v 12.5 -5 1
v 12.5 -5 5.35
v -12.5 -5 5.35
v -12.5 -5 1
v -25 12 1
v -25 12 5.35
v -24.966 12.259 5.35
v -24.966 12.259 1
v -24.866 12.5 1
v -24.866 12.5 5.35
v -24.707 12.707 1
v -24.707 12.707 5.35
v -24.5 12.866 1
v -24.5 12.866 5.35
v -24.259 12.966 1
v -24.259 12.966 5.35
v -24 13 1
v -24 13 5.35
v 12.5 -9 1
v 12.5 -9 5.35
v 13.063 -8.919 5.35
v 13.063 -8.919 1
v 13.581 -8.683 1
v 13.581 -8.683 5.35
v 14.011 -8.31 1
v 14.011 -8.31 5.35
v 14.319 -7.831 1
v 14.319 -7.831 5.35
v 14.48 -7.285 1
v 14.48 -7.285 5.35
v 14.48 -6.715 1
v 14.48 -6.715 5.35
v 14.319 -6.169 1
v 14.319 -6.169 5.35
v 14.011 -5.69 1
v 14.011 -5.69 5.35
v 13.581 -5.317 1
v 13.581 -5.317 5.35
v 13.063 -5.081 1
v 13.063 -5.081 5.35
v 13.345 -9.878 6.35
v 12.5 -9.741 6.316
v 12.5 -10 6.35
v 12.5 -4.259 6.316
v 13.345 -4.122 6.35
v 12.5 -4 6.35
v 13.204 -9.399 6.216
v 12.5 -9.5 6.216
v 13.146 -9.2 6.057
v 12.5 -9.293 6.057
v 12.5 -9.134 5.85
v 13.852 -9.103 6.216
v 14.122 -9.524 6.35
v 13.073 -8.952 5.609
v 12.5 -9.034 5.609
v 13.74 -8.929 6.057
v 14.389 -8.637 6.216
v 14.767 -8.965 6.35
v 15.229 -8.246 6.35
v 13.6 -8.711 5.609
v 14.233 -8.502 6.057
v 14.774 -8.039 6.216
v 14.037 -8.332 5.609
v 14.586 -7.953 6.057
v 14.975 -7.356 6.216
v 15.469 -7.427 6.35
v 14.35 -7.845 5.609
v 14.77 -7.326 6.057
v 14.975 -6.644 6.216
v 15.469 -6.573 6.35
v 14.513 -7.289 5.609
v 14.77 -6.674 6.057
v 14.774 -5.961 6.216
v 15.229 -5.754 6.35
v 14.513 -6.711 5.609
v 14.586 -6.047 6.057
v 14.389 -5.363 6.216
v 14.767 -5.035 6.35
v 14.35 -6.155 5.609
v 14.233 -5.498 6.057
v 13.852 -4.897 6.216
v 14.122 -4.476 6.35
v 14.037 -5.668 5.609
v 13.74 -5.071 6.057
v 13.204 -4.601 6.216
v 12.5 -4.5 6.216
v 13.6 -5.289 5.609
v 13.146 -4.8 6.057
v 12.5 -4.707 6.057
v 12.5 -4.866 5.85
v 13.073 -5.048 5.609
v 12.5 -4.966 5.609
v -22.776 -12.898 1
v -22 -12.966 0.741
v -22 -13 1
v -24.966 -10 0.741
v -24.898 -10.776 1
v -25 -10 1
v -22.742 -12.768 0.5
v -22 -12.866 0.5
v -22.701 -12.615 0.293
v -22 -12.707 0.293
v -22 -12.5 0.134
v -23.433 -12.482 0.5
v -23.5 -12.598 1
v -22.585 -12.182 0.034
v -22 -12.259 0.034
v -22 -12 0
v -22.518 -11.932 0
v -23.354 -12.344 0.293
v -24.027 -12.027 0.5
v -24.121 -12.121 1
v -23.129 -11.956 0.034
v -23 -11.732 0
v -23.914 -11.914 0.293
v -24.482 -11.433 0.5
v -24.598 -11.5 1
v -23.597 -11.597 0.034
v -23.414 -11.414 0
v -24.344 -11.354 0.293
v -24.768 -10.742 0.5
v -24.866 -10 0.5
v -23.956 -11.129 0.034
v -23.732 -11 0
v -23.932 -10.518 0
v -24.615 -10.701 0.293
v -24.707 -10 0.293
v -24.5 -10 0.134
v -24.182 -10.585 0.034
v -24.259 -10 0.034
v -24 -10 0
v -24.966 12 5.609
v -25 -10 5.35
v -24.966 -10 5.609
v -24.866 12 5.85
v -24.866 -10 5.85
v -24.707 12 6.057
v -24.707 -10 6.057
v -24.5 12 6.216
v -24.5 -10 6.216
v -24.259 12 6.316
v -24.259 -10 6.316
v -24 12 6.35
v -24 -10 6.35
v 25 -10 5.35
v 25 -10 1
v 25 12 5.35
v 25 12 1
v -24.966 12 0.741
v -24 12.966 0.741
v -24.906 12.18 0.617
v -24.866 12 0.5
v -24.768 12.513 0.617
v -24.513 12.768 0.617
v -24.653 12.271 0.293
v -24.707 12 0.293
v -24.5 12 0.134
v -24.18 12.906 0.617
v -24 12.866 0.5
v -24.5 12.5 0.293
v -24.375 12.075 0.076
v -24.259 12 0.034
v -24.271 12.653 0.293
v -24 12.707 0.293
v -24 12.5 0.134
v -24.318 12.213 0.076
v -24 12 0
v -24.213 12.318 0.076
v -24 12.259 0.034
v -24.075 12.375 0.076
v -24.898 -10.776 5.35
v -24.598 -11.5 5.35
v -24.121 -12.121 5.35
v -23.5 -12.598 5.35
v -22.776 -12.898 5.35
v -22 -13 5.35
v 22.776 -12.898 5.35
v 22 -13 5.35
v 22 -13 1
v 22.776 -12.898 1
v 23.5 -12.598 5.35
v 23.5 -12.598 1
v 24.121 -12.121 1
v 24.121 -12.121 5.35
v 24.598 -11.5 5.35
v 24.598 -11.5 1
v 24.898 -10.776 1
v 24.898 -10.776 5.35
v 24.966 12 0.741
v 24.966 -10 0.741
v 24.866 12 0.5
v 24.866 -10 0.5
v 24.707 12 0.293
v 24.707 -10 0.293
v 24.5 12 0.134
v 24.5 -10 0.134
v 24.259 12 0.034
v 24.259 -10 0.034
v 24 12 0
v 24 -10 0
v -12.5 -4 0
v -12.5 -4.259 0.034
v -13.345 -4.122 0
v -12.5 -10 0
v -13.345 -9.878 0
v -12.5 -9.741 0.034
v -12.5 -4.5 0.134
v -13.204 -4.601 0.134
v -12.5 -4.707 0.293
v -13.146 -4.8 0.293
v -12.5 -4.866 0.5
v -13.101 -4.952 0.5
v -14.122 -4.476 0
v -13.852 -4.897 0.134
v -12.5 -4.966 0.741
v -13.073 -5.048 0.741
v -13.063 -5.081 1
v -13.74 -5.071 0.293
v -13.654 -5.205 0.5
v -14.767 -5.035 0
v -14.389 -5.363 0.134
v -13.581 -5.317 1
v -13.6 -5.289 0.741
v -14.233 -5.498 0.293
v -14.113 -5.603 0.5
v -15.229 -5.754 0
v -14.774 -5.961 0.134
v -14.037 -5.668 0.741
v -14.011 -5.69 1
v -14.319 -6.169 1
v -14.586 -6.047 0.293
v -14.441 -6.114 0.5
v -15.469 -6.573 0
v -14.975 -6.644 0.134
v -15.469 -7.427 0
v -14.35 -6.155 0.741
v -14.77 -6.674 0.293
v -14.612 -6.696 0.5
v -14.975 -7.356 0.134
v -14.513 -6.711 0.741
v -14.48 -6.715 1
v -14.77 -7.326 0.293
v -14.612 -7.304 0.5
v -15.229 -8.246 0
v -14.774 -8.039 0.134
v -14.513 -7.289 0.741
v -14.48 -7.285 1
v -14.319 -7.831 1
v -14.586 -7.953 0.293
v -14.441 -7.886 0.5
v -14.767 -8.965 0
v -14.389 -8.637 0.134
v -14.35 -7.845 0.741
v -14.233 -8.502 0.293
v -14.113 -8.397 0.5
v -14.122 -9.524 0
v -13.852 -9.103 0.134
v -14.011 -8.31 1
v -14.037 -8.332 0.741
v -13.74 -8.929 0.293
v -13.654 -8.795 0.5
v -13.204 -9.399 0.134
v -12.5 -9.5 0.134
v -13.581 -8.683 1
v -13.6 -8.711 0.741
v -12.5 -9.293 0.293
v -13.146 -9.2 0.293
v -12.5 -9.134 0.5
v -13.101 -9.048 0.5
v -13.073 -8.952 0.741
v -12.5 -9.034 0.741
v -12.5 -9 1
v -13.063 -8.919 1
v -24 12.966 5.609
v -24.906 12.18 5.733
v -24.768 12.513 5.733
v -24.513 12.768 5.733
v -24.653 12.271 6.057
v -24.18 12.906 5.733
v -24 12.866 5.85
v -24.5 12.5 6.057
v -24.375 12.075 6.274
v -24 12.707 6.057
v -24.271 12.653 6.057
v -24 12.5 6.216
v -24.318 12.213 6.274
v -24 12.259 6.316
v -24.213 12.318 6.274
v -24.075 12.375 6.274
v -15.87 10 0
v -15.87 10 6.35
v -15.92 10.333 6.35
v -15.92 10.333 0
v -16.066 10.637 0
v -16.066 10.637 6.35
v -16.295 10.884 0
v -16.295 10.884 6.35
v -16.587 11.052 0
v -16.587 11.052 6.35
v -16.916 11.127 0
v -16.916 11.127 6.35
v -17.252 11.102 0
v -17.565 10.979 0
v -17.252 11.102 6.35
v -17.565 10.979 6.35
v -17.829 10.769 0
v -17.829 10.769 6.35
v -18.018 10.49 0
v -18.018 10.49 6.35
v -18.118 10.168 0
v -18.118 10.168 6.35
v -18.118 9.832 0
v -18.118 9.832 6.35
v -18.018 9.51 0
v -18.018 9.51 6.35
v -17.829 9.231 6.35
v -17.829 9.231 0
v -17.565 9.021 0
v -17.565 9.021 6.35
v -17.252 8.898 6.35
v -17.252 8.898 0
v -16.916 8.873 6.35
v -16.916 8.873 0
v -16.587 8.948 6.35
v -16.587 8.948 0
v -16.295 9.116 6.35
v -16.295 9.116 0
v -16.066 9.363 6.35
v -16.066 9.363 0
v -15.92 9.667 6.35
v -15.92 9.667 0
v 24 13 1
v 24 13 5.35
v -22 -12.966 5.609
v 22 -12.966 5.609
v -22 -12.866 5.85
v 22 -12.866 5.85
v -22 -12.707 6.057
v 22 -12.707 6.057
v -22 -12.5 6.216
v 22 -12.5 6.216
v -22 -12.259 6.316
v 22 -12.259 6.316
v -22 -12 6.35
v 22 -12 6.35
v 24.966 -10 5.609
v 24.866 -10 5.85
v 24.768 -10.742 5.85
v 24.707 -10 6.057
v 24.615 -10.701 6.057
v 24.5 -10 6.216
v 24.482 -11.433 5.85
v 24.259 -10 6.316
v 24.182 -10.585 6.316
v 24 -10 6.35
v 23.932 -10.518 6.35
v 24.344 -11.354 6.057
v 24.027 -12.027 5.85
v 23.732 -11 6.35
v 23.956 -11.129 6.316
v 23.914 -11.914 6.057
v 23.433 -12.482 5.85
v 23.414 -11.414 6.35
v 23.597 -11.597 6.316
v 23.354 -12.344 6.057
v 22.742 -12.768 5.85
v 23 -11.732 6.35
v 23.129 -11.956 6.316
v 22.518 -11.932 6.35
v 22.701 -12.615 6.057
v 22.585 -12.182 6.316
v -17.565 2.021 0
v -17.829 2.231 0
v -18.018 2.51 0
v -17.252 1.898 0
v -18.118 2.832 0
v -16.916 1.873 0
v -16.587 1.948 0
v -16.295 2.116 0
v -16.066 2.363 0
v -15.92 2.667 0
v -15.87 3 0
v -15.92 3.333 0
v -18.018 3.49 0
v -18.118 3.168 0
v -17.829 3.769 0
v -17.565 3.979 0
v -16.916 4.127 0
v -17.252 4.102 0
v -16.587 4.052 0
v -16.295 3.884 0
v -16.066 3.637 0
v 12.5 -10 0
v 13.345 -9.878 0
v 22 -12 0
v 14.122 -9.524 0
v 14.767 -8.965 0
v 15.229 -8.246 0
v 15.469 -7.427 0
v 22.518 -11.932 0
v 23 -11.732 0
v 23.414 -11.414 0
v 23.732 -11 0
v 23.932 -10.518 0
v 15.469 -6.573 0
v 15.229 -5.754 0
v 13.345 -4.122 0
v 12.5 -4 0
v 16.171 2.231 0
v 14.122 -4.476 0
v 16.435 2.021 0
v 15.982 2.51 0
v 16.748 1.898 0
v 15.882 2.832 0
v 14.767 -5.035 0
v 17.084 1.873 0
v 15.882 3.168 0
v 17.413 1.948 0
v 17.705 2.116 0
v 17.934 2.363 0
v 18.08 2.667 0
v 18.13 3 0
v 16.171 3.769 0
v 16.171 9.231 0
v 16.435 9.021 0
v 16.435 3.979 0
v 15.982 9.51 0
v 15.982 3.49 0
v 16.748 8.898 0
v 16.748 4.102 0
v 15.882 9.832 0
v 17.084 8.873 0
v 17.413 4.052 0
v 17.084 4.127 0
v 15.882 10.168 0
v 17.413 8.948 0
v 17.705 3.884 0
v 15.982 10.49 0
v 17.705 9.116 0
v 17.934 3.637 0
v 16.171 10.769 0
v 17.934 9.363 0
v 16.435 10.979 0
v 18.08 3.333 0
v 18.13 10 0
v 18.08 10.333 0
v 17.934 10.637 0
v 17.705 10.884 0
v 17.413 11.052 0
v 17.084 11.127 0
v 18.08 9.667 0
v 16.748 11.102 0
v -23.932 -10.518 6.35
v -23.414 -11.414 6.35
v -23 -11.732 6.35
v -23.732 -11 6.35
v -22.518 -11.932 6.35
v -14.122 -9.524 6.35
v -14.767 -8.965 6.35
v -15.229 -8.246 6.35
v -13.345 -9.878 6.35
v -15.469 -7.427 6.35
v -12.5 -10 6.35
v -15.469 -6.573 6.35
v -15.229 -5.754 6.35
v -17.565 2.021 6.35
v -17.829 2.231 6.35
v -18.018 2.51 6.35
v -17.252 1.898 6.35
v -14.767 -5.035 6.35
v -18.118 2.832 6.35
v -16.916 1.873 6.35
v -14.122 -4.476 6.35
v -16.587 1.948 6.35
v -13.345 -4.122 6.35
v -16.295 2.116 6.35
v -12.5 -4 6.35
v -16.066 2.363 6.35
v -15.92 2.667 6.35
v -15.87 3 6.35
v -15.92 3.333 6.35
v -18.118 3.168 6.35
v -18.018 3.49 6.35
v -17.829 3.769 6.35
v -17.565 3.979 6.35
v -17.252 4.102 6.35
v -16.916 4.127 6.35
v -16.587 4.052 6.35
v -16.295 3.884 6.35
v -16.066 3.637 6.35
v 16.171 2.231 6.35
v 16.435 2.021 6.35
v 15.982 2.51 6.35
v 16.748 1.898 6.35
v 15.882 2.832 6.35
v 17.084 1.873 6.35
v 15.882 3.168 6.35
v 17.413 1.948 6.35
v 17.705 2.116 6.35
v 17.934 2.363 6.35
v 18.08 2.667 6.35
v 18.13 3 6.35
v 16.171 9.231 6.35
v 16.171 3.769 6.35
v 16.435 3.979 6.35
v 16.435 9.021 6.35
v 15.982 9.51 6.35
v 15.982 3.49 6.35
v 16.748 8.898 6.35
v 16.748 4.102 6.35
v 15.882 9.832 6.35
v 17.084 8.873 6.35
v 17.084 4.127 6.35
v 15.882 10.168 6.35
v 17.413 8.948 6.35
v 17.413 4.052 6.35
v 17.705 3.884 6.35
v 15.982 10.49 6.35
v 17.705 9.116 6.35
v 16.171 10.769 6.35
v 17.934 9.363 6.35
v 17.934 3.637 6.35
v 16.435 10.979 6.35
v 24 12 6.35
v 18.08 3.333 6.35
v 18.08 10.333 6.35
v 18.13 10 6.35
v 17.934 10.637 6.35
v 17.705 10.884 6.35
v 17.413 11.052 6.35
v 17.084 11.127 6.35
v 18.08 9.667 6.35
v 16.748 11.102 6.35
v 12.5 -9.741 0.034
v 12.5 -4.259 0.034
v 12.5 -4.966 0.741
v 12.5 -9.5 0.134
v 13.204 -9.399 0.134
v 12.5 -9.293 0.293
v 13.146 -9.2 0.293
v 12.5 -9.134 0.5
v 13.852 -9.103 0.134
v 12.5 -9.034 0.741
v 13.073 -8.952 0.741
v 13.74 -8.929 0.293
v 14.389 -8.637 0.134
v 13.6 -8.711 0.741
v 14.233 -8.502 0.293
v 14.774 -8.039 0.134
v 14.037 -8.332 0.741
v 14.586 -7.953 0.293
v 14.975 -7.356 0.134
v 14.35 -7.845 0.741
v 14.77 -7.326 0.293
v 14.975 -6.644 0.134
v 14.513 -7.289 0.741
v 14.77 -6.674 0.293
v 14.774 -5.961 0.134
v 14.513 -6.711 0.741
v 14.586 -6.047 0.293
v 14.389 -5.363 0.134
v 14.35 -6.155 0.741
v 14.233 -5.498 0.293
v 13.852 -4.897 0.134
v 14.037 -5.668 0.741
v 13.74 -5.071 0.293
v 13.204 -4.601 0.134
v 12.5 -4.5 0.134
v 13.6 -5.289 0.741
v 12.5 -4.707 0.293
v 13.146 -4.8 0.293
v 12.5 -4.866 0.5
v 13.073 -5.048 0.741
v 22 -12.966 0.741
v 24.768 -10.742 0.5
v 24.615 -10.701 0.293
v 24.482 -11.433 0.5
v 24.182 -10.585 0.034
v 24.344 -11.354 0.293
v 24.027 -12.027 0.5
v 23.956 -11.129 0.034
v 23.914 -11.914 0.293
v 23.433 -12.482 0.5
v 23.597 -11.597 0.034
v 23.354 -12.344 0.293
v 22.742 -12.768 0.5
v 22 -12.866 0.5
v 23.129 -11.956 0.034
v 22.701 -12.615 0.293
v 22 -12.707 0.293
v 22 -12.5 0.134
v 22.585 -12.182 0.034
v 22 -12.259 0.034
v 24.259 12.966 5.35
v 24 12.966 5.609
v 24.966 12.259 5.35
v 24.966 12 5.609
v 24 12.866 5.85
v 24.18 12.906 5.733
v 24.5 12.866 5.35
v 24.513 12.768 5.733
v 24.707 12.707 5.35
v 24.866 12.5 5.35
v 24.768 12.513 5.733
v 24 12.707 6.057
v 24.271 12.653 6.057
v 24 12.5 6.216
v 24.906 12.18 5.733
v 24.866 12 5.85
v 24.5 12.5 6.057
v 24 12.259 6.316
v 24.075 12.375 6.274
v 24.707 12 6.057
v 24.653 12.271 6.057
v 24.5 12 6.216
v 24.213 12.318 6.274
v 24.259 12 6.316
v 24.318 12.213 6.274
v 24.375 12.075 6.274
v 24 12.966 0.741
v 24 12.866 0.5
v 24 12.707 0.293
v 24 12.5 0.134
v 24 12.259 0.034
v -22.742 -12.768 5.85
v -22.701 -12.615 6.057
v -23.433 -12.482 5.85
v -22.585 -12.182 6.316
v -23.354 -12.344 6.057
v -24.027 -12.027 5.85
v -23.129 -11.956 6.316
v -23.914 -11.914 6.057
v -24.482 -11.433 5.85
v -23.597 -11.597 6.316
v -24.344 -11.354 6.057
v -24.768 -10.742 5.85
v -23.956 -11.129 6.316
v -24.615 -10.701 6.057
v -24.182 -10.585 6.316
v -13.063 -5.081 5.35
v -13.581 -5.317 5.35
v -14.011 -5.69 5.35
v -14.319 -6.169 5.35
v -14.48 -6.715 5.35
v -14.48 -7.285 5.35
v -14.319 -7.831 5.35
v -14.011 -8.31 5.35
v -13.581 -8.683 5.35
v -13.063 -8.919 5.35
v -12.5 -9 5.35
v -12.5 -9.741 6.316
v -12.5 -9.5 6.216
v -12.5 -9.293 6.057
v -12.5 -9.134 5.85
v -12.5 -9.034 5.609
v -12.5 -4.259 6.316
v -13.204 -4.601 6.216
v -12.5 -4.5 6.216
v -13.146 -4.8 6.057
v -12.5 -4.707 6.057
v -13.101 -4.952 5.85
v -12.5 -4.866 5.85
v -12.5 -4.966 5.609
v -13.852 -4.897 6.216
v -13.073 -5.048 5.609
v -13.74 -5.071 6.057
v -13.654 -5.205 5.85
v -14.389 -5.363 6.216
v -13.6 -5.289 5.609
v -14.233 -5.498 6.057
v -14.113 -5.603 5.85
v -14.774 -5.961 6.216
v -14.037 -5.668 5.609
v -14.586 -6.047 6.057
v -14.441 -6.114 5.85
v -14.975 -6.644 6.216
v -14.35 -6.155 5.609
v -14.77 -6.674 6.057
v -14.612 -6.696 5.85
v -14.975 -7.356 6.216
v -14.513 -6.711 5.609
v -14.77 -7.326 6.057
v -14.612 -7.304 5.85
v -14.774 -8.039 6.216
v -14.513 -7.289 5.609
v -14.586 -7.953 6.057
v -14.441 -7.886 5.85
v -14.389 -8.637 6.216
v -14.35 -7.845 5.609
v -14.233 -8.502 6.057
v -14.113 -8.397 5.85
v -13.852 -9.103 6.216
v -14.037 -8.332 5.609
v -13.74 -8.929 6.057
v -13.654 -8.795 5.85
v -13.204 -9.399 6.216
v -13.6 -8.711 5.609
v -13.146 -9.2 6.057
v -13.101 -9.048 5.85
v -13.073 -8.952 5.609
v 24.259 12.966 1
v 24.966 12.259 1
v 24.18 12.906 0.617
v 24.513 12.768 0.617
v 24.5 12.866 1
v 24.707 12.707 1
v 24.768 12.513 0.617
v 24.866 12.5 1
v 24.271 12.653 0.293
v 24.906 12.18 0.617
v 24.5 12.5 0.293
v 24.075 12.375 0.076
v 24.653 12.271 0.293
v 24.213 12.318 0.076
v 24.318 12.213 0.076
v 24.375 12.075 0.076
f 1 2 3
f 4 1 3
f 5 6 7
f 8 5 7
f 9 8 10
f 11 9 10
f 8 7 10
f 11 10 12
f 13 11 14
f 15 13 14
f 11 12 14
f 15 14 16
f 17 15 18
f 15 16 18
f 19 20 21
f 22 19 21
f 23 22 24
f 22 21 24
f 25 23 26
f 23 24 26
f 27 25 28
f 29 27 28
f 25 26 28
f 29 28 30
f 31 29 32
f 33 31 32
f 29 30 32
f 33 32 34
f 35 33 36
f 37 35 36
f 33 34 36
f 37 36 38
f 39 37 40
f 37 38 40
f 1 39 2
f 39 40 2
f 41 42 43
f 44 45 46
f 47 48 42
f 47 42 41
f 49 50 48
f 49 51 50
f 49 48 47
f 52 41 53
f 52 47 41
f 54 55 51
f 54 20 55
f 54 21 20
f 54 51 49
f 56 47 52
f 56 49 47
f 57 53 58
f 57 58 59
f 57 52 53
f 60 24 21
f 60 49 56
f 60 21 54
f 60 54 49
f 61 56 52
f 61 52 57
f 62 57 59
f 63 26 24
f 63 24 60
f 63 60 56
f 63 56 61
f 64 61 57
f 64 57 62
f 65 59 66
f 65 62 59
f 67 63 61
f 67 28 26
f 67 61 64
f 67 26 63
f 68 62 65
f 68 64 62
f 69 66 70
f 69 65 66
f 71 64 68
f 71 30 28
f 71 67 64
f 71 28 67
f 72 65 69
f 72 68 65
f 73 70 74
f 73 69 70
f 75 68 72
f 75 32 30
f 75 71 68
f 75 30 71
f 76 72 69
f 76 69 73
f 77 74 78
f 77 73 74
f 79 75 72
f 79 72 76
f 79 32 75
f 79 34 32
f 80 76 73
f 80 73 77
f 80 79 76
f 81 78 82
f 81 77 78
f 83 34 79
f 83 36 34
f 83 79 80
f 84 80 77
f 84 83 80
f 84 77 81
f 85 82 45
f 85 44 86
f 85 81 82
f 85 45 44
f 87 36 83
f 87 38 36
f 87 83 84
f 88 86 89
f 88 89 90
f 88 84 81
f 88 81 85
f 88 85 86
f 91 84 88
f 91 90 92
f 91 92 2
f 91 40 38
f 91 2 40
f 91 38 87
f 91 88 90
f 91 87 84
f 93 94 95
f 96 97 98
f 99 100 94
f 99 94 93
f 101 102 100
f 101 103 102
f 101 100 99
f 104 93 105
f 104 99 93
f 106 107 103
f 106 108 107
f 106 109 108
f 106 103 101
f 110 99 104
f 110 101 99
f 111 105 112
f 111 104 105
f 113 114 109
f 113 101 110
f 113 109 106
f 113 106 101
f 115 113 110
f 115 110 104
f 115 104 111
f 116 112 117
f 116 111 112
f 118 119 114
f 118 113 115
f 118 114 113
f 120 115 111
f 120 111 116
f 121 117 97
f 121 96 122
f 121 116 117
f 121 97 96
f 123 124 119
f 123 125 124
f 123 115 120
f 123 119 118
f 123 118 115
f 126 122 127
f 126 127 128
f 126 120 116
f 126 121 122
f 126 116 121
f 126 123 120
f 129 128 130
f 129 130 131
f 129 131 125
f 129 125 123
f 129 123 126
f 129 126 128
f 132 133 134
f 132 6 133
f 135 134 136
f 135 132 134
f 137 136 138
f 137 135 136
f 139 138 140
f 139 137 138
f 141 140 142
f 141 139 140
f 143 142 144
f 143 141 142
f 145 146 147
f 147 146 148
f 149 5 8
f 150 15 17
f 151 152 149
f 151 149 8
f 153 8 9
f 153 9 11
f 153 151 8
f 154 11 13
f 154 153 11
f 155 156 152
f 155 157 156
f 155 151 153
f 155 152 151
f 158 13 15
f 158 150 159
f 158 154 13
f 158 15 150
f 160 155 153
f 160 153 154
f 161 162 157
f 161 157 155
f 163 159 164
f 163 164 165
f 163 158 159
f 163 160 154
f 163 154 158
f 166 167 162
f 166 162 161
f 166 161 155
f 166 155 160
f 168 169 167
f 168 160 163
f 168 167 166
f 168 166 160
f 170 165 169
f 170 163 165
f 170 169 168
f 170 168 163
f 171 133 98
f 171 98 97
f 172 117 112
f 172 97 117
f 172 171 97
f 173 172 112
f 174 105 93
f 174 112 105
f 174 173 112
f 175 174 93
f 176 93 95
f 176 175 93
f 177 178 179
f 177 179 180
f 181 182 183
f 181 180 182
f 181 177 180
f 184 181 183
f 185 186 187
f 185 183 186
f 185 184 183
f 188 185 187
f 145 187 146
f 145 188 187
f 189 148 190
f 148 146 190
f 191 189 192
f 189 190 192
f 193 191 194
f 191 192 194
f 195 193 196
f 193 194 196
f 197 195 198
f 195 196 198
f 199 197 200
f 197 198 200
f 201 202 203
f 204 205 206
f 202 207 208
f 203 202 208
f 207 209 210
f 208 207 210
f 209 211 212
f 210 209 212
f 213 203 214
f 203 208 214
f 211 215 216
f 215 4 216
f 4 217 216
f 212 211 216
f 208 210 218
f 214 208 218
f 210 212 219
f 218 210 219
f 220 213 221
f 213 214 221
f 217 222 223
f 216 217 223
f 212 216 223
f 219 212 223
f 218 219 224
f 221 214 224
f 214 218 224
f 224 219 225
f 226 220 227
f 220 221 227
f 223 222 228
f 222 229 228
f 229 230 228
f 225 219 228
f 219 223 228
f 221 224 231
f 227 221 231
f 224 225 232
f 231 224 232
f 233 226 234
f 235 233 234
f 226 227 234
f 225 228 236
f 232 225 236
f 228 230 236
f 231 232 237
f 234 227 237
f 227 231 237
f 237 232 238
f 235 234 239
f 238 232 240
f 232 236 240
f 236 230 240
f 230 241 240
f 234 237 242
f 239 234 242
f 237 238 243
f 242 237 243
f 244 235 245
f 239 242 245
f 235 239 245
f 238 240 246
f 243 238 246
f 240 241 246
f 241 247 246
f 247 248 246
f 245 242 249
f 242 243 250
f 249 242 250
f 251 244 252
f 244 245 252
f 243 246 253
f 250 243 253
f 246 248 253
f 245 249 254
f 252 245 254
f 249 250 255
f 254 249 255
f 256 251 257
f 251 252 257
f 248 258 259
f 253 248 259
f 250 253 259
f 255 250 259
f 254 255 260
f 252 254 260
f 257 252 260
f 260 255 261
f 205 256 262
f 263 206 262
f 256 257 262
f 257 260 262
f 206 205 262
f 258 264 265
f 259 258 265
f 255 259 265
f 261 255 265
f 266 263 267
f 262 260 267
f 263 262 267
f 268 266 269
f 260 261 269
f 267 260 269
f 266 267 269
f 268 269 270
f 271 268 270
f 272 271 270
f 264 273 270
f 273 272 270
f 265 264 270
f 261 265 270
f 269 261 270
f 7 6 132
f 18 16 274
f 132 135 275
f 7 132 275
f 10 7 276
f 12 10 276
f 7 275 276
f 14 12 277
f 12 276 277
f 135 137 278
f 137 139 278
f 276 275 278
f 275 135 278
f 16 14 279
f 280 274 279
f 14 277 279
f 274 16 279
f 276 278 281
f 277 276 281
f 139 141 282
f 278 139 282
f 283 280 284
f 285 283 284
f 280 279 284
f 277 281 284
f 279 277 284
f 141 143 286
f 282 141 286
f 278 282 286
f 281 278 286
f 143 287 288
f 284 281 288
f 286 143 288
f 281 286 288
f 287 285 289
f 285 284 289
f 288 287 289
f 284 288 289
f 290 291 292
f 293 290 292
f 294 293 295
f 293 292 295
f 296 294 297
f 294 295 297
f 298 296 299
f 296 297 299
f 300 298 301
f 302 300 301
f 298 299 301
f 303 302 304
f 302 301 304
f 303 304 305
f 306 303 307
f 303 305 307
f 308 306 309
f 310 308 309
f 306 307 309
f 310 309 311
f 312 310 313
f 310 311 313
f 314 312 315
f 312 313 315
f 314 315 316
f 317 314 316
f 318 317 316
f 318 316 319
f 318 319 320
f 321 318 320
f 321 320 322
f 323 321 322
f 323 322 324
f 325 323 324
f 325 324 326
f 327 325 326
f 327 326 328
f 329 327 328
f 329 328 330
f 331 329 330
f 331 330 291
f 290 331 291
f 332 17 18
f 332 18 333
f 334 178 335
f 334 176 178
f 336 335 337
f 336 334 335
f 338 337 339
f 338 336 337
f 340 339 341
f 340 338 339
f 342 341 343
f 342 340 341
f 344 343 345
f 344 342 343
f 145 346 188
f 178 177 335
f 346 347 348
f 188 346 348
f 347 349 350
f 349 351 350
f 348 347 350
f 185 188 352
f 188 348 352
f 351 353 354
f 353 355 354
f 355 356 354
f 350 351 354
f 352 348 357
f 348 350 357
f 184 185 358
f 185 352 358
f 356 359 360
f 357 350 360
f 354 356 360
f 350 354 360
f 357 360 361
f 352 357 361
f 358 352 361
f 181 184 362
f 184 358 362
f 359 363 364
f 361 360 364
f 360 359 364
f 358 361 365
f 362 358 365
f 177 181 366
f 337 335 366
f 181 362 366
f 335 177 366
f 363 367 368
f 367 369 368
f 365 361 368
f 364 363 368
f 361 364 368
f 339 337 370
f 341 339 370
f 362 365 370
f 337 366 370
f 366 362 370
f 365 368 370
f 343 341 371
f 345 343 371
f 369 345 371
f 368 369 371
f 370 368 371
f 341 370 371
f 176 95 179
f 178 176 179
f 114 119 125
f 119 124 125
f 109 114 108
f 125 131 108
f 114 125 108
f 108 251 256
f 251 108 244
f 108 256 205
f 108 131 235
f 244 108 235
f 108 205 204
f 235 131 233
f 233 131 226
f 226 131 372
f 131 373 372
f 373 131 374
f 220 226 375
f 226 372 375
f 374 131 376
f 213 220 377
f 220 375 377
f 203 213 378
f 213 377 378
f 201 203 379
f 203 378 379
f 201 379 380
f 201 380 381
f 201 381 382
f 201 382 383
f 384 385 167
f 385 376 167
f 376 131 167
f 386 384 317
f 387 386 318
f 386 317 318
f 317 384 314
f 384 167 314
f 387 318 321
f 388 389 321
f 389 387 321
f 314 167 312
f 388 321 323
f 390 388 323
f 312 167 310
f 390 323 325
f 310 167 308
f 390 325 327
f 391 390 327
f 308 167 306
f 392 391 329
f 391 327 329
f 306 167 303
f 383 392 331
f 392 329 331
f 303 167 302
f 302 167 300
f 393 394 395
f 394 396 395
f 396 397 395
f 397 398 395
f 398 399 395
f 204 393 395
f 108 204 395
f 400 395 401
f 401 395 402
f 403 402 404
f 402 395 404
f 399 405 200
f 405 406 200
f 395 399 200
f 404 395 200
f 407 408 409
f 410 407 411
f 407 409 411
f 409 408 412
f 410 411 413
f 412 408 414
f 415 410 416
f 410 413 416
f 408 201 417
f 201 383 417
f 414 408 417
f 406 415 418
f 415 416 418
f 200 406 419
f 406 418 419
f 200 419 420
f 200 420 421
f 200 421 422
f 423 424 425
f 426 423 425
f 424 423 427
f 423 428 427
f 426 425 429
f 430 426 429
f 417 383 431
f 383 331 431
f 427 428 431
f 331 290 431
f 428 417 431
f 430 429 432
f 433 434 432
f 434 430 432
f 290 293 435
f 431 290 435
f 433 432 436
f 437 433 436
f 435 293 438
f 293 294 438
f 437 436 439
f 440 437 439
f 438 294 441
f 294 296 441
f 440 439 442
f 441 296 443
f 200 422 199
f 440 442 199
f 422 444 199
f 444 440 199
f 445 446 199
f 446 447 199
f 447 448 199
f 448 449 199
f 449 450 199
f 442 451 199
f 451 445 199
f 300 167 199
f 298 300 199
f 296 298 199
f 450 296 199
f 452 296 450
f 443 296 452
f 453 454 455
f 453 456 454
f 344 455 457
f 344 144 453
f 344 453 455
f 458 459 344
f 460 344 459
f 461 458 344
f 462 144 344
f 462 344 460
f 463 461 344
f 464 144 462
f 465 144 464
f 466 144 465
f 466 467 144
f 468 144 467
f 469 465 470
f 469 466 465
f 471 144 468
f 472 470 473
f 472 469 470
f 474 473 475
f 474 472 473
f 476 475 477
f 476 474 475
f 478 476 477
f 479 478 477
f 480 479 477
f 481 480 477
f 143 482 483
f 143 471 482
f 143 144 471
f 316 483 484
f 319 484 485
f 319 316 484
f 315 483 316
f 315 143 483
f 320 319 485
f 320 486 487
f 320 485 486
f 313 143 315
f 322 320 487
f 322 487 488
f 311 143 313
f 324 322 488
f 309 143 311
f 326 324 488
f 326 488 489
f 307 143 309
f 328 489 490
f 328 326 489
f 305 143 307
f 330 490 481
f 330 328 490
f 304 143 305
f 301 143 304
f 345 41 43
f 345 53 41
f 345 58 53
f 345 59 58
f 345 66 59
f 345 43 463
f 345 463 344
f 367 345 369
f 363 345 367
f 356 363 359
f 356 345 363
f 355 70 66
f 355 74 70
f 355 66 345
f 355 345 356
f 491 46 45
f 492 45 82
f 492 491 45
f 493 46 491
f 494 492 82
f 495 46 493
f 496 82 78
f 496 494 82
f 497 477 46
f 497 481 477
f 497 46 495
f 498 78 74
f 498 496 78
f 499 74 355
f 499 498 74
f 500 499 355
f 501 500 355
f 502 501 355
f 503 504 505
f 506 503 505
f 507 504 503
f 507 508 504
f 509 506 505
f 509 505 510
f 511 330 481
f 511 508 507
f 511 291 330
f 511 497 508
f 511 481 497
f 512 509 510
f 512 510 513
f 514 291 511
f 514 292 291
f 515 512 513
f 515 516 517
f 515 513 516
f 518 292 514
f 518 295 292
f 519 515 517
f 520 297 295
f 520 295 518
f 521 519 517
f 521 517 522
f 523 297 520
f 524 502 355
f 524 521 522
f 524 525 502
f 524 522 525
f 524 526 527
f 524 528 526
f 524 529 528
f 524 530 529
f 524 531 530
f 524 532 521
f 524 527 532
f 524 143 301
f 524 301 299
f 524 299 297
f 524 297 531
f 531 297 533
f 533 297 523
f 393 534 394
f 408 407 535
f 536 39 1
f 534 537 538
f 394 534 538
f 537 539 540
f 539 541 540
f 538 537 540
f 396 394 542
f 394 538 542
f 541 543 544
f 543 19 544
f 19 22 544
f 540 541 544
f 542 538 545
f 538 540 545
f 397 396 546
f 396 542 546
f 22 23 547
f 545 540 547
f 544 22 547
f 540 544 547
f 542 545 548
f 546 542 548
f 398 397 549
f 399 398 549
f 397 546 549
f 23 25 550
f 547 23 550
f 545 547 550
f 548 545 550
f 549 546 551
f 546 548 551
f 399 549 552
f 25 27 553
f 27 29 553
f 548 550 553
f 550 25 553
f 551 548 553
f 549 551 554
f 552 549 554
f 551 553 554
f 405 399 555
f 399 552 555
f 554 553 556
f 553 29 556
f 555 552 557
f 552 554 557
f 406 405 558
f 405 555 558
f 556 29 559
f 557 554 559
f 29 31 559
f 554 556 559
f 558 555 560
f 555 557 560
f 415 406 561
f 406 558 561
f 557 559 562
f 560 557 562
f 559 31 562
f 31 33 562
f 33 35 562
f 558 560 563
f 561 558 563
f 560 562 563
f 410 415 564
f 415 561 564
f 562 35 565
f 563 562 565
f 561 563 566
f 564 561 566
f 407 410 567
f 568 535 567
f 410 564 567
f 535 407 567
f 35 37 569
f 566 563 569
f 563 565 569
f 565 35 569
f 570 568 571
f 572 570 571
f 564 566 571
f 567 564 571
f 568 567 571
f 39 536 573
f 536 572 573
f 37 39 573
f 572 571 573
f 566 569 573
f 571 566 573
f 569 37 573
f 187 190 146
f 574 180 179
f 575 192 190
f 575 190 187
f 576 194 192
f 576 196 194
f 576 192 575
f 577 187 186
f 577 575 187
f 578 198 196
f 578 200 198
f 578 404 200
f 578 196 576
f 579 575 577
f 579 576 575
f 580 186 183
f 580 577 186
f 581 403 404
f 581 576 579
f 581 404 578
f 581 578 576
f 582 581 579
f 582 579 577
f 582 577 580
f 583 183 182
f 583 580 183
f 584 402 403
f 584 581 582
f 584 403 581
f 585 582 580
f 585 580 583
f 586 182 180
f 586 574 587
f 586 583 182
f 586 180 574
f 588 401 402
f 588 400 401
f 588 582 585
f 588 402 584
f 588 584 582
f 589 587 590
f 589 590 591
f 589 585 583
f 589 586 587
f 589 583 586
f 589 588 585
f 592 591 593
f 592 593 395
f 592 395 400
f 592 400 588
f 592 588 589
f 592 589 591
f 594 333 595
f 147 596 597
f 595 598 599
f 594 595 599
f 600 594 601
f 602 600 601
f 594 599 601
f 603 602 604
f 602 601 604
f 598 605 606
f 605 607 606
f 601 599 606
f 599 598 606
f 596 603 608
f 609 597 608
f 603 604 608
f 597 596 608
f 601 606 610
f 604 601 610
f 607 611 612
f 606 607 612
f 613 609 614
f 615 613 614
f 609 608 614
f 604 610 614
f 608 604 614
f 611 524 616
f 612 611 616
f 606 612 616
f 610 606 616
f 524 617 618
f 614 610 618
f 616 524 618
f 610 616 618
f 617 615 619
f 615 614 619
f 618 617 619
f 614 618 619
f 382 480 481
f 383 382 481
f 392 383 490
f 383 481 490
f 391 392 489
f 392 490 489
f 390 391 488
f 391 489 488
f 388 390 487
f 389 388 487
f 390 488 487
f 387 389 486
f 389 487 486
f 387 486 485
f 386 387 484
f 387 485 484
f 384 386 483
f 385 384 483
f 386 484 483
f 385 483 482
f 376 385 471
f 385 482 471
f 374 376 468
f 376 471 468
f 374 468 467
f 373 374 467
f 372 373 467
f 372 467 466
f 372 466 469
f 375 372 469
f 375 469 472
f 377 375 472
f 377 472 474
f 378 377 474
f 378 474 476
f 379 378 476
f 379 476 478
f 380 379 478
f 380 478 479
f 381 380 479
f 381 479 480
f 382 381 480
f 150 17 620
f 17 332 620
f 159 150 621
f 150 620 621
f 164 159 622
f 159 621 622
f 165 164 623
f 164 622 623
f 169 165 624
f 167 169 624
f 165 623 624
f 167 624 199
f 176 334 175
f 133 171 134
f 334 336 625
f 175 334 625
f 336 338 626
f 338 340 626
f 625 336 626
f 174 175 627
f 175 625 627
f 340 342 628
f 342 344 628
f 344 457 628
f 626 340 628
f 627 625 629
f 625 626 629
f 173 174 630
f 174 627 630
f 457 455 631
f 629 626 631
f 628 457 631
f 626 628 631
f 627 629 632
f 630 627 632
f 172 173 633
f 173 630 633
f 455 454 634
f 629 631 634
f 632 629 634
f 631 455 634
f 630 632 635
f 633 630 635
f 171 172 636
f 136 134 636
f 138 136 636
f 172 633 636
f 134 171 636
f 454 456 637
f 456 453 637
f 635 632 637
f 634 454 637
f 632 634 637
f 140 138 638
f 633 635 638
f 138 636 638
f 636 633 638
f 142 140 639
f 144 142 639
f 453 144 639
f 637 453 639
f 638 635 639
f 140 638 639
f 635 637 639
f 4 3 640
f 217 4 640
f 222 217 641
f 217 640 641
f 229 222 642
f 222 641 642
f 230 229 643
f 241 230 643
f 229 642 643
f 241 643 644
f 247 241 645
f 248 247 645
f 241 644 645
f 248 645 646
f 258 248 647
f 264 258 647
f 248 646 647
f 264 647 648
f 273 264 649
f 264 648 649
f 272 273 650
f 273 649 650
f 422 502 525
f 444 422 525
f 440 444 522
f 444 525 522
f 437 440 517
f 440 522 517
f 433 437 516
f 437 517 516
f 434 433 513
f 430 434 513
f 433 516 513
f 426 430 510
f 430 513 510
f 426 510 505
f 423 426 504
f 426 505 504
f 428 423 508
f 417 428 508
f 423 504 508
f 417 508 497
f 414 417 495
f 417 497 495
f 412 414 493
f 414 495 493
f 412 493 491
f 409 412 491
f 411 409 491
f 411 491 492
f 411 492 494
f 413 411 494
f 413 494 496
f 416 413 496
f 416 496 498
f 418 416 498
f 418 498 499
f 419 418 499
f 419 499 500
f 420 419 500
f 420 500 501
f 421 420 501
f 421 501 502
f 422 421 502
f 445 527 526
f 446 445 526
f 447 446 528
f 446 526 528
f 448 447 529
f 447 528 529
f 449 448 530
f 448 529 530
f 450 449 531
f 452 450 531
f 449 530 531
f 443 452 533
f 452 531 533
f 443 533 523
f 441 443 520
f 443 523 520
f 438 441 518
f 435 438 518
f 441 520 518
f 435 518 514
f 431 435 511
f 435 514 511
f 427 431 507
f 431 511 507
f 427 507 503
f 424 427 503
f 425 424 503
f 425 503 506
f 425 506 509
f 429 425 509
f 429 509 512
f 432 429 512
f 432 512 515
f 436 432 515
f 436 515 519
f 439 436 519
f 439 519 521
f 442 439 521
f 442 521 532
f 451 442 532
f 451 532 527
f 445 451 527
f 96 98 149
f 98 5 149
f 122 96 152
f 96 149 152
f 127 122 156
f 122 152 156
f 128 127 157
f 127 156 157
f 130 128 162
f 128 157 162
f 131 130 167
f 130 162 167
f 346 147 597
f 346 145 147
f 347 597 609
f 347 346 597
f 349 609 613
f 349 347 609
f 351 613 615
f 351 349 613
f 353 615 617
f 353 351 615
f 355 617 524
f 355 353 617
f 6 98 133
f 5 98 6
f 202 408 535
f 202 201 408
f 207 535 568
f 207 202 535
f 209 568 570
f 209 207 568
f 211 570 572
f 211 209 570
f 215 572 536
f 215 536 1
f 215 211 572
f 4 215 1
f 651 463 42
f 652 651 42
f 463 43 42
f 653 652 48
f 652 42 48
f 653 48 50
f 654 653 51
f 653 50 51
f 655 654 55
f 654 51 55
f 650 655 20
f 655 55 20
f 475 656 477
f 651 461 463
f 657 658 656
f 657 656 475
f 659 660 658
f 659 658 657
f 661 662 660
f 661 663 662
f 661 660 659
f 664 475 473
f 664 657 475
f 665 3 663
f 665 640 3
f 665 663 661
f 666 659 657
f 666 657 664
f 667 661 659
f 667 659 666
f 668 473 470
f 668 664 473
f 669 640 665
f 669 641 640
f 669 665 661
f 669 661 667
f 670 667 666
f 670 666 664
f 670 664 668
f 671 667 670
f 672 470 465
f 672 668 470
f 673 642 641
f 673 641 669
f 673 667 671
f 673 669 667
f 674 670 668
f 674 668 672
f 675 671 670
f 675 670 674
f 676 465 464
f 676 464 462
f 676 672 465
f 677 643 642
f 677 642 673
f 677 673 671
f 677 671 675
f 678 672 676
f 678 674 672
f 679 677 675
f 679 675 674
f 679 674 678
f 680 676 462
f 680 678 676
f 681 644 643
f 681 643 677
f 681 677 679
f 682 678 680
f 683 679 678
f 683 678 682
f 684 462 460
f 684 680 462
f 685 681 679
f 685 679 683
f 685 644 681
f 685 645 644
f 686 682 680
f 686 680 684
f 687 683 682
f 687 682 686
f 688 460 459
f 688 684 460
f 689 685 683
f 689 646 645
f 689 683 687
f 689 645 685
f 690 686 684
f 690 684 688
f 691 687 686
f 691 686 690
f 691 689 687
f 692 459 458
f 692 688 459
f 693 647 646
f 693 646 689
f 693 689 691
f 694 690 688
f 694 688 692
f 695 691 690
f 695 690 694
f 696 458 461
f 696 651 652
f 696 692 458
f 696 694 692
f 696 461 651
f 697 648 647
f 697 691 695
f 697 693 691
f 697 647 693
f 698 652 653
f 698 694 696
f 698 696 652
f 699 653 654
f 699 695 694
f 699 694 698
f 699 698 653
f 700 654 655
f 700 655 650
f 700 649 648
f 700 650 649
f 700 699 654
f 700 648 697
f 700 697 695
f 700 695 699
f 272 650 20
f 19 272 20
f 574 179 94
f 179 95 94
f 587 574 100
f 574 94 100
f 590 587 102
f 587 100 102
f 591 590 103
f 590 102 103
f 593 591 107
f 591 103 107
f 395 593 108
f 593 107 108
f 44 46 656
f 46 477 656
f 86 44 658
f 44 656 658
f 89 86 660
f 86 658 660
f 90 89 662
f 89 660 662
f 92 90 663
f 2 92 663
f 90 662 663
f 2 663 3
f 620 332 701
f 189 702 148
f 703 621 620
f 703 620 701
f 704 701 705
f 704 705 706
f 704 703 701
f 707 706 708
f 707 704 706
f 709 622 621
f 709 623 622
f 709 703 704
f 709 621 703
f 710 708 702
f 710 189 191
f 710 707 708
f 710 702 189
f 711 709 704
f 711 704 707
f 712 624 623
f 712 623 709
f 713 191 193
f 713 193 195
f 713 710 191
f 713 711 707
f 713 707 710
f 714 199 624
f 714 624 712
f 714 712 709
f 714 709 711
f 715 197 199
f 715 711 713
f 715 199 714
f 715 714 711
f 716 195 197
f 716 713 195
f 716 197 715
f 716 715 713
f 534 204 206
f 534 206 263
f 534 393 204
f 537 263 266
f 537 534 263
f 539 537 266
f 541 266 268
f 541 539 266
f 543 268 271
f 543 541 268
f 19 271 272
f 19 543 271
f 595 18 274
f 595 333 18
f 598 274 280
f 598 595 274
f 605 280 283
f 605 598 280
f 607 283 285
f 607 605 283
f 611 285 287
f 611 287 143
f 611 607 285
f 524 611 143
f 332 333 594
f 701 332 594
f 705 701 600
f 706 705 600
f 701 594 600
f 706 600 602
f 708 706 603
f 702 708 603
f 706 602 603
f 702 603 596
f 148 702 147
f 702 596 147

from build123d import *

# Parameters (mm, degrees)
F0_W     = 50
F0_H     = 26
F1_DEPTH = 6.35
F2_R     = 1.1303
F3_DEPTH = 6.351
F5_DEPTH = 6.351
F6_R     = 1
F7_R     = 3
F8_R     = 1


with BuildPart() as f1:
    # F0 (on Top) → F1 (new body)
    with BuildSketch(Plane.XY):
        Rectangle(F0_W, F0_H)
    extrude(amount=F1_DEPTH)

    # F2 (on face) → F3 (cut, through all)
    with BuildSketch(Plane.XY.offset(6.35)):
        with Locations((-17, 10)):
            Circle(F2_R)
        with Locations((-17, 3)):
            Circle(F2_R)
        with Locations((17, 3)):
            Circle(F2_R)
        with Locations((17, 10)):
            Circle(F2_R)
    extrude(amount=-F3_DEPTH, mode=Mode.SUBTRACT)

    # F4 (on face) → F5 (cut, through all)
    with BuildSketch(Plane.XY.offset(6.35)):
        with BuildLine():
            Line((12.5, -5), (-12.5, -5))
            ThreePointArc((-12.5, -5), (-14.5, -7), (-12.5, -9))
            Line((-12.5, -9), (12.5, -9))
            ThreePointArc((12.5, -9), (14.5, -7), (12.5, -5))
        make_face()
    extrude(amount=-F5_DEPTH, mode=Mode.SUBTRACT)

    # F6
    f6_edges = [f1.edges().sort_by_distance(p)[0] for p in [
        (-25, 13, 3.175),
        (25, 13, 3.175),
        (0, -5, 6.35),
        (0, -5, 0),
    ]]
    fillet(f6_edges, radius=F6_R)

    # F7
    f7_edges = [f1.edges().sort_by_distance(p)[0] for p in [
        (-25, -13, 3.175),
        (25, -13, 3.175),
    ]]
    fillet(f7_edges, radius=F7_R)

    # F8
    f8_edges = [f1.edges().sort_by_distance(p)[0] for p in [
        (-25, 1, 6.35),
        (-25, 1, 0),
    ]]
    fillet(f8_edges, radius=F8_R)


solid = f1.part
